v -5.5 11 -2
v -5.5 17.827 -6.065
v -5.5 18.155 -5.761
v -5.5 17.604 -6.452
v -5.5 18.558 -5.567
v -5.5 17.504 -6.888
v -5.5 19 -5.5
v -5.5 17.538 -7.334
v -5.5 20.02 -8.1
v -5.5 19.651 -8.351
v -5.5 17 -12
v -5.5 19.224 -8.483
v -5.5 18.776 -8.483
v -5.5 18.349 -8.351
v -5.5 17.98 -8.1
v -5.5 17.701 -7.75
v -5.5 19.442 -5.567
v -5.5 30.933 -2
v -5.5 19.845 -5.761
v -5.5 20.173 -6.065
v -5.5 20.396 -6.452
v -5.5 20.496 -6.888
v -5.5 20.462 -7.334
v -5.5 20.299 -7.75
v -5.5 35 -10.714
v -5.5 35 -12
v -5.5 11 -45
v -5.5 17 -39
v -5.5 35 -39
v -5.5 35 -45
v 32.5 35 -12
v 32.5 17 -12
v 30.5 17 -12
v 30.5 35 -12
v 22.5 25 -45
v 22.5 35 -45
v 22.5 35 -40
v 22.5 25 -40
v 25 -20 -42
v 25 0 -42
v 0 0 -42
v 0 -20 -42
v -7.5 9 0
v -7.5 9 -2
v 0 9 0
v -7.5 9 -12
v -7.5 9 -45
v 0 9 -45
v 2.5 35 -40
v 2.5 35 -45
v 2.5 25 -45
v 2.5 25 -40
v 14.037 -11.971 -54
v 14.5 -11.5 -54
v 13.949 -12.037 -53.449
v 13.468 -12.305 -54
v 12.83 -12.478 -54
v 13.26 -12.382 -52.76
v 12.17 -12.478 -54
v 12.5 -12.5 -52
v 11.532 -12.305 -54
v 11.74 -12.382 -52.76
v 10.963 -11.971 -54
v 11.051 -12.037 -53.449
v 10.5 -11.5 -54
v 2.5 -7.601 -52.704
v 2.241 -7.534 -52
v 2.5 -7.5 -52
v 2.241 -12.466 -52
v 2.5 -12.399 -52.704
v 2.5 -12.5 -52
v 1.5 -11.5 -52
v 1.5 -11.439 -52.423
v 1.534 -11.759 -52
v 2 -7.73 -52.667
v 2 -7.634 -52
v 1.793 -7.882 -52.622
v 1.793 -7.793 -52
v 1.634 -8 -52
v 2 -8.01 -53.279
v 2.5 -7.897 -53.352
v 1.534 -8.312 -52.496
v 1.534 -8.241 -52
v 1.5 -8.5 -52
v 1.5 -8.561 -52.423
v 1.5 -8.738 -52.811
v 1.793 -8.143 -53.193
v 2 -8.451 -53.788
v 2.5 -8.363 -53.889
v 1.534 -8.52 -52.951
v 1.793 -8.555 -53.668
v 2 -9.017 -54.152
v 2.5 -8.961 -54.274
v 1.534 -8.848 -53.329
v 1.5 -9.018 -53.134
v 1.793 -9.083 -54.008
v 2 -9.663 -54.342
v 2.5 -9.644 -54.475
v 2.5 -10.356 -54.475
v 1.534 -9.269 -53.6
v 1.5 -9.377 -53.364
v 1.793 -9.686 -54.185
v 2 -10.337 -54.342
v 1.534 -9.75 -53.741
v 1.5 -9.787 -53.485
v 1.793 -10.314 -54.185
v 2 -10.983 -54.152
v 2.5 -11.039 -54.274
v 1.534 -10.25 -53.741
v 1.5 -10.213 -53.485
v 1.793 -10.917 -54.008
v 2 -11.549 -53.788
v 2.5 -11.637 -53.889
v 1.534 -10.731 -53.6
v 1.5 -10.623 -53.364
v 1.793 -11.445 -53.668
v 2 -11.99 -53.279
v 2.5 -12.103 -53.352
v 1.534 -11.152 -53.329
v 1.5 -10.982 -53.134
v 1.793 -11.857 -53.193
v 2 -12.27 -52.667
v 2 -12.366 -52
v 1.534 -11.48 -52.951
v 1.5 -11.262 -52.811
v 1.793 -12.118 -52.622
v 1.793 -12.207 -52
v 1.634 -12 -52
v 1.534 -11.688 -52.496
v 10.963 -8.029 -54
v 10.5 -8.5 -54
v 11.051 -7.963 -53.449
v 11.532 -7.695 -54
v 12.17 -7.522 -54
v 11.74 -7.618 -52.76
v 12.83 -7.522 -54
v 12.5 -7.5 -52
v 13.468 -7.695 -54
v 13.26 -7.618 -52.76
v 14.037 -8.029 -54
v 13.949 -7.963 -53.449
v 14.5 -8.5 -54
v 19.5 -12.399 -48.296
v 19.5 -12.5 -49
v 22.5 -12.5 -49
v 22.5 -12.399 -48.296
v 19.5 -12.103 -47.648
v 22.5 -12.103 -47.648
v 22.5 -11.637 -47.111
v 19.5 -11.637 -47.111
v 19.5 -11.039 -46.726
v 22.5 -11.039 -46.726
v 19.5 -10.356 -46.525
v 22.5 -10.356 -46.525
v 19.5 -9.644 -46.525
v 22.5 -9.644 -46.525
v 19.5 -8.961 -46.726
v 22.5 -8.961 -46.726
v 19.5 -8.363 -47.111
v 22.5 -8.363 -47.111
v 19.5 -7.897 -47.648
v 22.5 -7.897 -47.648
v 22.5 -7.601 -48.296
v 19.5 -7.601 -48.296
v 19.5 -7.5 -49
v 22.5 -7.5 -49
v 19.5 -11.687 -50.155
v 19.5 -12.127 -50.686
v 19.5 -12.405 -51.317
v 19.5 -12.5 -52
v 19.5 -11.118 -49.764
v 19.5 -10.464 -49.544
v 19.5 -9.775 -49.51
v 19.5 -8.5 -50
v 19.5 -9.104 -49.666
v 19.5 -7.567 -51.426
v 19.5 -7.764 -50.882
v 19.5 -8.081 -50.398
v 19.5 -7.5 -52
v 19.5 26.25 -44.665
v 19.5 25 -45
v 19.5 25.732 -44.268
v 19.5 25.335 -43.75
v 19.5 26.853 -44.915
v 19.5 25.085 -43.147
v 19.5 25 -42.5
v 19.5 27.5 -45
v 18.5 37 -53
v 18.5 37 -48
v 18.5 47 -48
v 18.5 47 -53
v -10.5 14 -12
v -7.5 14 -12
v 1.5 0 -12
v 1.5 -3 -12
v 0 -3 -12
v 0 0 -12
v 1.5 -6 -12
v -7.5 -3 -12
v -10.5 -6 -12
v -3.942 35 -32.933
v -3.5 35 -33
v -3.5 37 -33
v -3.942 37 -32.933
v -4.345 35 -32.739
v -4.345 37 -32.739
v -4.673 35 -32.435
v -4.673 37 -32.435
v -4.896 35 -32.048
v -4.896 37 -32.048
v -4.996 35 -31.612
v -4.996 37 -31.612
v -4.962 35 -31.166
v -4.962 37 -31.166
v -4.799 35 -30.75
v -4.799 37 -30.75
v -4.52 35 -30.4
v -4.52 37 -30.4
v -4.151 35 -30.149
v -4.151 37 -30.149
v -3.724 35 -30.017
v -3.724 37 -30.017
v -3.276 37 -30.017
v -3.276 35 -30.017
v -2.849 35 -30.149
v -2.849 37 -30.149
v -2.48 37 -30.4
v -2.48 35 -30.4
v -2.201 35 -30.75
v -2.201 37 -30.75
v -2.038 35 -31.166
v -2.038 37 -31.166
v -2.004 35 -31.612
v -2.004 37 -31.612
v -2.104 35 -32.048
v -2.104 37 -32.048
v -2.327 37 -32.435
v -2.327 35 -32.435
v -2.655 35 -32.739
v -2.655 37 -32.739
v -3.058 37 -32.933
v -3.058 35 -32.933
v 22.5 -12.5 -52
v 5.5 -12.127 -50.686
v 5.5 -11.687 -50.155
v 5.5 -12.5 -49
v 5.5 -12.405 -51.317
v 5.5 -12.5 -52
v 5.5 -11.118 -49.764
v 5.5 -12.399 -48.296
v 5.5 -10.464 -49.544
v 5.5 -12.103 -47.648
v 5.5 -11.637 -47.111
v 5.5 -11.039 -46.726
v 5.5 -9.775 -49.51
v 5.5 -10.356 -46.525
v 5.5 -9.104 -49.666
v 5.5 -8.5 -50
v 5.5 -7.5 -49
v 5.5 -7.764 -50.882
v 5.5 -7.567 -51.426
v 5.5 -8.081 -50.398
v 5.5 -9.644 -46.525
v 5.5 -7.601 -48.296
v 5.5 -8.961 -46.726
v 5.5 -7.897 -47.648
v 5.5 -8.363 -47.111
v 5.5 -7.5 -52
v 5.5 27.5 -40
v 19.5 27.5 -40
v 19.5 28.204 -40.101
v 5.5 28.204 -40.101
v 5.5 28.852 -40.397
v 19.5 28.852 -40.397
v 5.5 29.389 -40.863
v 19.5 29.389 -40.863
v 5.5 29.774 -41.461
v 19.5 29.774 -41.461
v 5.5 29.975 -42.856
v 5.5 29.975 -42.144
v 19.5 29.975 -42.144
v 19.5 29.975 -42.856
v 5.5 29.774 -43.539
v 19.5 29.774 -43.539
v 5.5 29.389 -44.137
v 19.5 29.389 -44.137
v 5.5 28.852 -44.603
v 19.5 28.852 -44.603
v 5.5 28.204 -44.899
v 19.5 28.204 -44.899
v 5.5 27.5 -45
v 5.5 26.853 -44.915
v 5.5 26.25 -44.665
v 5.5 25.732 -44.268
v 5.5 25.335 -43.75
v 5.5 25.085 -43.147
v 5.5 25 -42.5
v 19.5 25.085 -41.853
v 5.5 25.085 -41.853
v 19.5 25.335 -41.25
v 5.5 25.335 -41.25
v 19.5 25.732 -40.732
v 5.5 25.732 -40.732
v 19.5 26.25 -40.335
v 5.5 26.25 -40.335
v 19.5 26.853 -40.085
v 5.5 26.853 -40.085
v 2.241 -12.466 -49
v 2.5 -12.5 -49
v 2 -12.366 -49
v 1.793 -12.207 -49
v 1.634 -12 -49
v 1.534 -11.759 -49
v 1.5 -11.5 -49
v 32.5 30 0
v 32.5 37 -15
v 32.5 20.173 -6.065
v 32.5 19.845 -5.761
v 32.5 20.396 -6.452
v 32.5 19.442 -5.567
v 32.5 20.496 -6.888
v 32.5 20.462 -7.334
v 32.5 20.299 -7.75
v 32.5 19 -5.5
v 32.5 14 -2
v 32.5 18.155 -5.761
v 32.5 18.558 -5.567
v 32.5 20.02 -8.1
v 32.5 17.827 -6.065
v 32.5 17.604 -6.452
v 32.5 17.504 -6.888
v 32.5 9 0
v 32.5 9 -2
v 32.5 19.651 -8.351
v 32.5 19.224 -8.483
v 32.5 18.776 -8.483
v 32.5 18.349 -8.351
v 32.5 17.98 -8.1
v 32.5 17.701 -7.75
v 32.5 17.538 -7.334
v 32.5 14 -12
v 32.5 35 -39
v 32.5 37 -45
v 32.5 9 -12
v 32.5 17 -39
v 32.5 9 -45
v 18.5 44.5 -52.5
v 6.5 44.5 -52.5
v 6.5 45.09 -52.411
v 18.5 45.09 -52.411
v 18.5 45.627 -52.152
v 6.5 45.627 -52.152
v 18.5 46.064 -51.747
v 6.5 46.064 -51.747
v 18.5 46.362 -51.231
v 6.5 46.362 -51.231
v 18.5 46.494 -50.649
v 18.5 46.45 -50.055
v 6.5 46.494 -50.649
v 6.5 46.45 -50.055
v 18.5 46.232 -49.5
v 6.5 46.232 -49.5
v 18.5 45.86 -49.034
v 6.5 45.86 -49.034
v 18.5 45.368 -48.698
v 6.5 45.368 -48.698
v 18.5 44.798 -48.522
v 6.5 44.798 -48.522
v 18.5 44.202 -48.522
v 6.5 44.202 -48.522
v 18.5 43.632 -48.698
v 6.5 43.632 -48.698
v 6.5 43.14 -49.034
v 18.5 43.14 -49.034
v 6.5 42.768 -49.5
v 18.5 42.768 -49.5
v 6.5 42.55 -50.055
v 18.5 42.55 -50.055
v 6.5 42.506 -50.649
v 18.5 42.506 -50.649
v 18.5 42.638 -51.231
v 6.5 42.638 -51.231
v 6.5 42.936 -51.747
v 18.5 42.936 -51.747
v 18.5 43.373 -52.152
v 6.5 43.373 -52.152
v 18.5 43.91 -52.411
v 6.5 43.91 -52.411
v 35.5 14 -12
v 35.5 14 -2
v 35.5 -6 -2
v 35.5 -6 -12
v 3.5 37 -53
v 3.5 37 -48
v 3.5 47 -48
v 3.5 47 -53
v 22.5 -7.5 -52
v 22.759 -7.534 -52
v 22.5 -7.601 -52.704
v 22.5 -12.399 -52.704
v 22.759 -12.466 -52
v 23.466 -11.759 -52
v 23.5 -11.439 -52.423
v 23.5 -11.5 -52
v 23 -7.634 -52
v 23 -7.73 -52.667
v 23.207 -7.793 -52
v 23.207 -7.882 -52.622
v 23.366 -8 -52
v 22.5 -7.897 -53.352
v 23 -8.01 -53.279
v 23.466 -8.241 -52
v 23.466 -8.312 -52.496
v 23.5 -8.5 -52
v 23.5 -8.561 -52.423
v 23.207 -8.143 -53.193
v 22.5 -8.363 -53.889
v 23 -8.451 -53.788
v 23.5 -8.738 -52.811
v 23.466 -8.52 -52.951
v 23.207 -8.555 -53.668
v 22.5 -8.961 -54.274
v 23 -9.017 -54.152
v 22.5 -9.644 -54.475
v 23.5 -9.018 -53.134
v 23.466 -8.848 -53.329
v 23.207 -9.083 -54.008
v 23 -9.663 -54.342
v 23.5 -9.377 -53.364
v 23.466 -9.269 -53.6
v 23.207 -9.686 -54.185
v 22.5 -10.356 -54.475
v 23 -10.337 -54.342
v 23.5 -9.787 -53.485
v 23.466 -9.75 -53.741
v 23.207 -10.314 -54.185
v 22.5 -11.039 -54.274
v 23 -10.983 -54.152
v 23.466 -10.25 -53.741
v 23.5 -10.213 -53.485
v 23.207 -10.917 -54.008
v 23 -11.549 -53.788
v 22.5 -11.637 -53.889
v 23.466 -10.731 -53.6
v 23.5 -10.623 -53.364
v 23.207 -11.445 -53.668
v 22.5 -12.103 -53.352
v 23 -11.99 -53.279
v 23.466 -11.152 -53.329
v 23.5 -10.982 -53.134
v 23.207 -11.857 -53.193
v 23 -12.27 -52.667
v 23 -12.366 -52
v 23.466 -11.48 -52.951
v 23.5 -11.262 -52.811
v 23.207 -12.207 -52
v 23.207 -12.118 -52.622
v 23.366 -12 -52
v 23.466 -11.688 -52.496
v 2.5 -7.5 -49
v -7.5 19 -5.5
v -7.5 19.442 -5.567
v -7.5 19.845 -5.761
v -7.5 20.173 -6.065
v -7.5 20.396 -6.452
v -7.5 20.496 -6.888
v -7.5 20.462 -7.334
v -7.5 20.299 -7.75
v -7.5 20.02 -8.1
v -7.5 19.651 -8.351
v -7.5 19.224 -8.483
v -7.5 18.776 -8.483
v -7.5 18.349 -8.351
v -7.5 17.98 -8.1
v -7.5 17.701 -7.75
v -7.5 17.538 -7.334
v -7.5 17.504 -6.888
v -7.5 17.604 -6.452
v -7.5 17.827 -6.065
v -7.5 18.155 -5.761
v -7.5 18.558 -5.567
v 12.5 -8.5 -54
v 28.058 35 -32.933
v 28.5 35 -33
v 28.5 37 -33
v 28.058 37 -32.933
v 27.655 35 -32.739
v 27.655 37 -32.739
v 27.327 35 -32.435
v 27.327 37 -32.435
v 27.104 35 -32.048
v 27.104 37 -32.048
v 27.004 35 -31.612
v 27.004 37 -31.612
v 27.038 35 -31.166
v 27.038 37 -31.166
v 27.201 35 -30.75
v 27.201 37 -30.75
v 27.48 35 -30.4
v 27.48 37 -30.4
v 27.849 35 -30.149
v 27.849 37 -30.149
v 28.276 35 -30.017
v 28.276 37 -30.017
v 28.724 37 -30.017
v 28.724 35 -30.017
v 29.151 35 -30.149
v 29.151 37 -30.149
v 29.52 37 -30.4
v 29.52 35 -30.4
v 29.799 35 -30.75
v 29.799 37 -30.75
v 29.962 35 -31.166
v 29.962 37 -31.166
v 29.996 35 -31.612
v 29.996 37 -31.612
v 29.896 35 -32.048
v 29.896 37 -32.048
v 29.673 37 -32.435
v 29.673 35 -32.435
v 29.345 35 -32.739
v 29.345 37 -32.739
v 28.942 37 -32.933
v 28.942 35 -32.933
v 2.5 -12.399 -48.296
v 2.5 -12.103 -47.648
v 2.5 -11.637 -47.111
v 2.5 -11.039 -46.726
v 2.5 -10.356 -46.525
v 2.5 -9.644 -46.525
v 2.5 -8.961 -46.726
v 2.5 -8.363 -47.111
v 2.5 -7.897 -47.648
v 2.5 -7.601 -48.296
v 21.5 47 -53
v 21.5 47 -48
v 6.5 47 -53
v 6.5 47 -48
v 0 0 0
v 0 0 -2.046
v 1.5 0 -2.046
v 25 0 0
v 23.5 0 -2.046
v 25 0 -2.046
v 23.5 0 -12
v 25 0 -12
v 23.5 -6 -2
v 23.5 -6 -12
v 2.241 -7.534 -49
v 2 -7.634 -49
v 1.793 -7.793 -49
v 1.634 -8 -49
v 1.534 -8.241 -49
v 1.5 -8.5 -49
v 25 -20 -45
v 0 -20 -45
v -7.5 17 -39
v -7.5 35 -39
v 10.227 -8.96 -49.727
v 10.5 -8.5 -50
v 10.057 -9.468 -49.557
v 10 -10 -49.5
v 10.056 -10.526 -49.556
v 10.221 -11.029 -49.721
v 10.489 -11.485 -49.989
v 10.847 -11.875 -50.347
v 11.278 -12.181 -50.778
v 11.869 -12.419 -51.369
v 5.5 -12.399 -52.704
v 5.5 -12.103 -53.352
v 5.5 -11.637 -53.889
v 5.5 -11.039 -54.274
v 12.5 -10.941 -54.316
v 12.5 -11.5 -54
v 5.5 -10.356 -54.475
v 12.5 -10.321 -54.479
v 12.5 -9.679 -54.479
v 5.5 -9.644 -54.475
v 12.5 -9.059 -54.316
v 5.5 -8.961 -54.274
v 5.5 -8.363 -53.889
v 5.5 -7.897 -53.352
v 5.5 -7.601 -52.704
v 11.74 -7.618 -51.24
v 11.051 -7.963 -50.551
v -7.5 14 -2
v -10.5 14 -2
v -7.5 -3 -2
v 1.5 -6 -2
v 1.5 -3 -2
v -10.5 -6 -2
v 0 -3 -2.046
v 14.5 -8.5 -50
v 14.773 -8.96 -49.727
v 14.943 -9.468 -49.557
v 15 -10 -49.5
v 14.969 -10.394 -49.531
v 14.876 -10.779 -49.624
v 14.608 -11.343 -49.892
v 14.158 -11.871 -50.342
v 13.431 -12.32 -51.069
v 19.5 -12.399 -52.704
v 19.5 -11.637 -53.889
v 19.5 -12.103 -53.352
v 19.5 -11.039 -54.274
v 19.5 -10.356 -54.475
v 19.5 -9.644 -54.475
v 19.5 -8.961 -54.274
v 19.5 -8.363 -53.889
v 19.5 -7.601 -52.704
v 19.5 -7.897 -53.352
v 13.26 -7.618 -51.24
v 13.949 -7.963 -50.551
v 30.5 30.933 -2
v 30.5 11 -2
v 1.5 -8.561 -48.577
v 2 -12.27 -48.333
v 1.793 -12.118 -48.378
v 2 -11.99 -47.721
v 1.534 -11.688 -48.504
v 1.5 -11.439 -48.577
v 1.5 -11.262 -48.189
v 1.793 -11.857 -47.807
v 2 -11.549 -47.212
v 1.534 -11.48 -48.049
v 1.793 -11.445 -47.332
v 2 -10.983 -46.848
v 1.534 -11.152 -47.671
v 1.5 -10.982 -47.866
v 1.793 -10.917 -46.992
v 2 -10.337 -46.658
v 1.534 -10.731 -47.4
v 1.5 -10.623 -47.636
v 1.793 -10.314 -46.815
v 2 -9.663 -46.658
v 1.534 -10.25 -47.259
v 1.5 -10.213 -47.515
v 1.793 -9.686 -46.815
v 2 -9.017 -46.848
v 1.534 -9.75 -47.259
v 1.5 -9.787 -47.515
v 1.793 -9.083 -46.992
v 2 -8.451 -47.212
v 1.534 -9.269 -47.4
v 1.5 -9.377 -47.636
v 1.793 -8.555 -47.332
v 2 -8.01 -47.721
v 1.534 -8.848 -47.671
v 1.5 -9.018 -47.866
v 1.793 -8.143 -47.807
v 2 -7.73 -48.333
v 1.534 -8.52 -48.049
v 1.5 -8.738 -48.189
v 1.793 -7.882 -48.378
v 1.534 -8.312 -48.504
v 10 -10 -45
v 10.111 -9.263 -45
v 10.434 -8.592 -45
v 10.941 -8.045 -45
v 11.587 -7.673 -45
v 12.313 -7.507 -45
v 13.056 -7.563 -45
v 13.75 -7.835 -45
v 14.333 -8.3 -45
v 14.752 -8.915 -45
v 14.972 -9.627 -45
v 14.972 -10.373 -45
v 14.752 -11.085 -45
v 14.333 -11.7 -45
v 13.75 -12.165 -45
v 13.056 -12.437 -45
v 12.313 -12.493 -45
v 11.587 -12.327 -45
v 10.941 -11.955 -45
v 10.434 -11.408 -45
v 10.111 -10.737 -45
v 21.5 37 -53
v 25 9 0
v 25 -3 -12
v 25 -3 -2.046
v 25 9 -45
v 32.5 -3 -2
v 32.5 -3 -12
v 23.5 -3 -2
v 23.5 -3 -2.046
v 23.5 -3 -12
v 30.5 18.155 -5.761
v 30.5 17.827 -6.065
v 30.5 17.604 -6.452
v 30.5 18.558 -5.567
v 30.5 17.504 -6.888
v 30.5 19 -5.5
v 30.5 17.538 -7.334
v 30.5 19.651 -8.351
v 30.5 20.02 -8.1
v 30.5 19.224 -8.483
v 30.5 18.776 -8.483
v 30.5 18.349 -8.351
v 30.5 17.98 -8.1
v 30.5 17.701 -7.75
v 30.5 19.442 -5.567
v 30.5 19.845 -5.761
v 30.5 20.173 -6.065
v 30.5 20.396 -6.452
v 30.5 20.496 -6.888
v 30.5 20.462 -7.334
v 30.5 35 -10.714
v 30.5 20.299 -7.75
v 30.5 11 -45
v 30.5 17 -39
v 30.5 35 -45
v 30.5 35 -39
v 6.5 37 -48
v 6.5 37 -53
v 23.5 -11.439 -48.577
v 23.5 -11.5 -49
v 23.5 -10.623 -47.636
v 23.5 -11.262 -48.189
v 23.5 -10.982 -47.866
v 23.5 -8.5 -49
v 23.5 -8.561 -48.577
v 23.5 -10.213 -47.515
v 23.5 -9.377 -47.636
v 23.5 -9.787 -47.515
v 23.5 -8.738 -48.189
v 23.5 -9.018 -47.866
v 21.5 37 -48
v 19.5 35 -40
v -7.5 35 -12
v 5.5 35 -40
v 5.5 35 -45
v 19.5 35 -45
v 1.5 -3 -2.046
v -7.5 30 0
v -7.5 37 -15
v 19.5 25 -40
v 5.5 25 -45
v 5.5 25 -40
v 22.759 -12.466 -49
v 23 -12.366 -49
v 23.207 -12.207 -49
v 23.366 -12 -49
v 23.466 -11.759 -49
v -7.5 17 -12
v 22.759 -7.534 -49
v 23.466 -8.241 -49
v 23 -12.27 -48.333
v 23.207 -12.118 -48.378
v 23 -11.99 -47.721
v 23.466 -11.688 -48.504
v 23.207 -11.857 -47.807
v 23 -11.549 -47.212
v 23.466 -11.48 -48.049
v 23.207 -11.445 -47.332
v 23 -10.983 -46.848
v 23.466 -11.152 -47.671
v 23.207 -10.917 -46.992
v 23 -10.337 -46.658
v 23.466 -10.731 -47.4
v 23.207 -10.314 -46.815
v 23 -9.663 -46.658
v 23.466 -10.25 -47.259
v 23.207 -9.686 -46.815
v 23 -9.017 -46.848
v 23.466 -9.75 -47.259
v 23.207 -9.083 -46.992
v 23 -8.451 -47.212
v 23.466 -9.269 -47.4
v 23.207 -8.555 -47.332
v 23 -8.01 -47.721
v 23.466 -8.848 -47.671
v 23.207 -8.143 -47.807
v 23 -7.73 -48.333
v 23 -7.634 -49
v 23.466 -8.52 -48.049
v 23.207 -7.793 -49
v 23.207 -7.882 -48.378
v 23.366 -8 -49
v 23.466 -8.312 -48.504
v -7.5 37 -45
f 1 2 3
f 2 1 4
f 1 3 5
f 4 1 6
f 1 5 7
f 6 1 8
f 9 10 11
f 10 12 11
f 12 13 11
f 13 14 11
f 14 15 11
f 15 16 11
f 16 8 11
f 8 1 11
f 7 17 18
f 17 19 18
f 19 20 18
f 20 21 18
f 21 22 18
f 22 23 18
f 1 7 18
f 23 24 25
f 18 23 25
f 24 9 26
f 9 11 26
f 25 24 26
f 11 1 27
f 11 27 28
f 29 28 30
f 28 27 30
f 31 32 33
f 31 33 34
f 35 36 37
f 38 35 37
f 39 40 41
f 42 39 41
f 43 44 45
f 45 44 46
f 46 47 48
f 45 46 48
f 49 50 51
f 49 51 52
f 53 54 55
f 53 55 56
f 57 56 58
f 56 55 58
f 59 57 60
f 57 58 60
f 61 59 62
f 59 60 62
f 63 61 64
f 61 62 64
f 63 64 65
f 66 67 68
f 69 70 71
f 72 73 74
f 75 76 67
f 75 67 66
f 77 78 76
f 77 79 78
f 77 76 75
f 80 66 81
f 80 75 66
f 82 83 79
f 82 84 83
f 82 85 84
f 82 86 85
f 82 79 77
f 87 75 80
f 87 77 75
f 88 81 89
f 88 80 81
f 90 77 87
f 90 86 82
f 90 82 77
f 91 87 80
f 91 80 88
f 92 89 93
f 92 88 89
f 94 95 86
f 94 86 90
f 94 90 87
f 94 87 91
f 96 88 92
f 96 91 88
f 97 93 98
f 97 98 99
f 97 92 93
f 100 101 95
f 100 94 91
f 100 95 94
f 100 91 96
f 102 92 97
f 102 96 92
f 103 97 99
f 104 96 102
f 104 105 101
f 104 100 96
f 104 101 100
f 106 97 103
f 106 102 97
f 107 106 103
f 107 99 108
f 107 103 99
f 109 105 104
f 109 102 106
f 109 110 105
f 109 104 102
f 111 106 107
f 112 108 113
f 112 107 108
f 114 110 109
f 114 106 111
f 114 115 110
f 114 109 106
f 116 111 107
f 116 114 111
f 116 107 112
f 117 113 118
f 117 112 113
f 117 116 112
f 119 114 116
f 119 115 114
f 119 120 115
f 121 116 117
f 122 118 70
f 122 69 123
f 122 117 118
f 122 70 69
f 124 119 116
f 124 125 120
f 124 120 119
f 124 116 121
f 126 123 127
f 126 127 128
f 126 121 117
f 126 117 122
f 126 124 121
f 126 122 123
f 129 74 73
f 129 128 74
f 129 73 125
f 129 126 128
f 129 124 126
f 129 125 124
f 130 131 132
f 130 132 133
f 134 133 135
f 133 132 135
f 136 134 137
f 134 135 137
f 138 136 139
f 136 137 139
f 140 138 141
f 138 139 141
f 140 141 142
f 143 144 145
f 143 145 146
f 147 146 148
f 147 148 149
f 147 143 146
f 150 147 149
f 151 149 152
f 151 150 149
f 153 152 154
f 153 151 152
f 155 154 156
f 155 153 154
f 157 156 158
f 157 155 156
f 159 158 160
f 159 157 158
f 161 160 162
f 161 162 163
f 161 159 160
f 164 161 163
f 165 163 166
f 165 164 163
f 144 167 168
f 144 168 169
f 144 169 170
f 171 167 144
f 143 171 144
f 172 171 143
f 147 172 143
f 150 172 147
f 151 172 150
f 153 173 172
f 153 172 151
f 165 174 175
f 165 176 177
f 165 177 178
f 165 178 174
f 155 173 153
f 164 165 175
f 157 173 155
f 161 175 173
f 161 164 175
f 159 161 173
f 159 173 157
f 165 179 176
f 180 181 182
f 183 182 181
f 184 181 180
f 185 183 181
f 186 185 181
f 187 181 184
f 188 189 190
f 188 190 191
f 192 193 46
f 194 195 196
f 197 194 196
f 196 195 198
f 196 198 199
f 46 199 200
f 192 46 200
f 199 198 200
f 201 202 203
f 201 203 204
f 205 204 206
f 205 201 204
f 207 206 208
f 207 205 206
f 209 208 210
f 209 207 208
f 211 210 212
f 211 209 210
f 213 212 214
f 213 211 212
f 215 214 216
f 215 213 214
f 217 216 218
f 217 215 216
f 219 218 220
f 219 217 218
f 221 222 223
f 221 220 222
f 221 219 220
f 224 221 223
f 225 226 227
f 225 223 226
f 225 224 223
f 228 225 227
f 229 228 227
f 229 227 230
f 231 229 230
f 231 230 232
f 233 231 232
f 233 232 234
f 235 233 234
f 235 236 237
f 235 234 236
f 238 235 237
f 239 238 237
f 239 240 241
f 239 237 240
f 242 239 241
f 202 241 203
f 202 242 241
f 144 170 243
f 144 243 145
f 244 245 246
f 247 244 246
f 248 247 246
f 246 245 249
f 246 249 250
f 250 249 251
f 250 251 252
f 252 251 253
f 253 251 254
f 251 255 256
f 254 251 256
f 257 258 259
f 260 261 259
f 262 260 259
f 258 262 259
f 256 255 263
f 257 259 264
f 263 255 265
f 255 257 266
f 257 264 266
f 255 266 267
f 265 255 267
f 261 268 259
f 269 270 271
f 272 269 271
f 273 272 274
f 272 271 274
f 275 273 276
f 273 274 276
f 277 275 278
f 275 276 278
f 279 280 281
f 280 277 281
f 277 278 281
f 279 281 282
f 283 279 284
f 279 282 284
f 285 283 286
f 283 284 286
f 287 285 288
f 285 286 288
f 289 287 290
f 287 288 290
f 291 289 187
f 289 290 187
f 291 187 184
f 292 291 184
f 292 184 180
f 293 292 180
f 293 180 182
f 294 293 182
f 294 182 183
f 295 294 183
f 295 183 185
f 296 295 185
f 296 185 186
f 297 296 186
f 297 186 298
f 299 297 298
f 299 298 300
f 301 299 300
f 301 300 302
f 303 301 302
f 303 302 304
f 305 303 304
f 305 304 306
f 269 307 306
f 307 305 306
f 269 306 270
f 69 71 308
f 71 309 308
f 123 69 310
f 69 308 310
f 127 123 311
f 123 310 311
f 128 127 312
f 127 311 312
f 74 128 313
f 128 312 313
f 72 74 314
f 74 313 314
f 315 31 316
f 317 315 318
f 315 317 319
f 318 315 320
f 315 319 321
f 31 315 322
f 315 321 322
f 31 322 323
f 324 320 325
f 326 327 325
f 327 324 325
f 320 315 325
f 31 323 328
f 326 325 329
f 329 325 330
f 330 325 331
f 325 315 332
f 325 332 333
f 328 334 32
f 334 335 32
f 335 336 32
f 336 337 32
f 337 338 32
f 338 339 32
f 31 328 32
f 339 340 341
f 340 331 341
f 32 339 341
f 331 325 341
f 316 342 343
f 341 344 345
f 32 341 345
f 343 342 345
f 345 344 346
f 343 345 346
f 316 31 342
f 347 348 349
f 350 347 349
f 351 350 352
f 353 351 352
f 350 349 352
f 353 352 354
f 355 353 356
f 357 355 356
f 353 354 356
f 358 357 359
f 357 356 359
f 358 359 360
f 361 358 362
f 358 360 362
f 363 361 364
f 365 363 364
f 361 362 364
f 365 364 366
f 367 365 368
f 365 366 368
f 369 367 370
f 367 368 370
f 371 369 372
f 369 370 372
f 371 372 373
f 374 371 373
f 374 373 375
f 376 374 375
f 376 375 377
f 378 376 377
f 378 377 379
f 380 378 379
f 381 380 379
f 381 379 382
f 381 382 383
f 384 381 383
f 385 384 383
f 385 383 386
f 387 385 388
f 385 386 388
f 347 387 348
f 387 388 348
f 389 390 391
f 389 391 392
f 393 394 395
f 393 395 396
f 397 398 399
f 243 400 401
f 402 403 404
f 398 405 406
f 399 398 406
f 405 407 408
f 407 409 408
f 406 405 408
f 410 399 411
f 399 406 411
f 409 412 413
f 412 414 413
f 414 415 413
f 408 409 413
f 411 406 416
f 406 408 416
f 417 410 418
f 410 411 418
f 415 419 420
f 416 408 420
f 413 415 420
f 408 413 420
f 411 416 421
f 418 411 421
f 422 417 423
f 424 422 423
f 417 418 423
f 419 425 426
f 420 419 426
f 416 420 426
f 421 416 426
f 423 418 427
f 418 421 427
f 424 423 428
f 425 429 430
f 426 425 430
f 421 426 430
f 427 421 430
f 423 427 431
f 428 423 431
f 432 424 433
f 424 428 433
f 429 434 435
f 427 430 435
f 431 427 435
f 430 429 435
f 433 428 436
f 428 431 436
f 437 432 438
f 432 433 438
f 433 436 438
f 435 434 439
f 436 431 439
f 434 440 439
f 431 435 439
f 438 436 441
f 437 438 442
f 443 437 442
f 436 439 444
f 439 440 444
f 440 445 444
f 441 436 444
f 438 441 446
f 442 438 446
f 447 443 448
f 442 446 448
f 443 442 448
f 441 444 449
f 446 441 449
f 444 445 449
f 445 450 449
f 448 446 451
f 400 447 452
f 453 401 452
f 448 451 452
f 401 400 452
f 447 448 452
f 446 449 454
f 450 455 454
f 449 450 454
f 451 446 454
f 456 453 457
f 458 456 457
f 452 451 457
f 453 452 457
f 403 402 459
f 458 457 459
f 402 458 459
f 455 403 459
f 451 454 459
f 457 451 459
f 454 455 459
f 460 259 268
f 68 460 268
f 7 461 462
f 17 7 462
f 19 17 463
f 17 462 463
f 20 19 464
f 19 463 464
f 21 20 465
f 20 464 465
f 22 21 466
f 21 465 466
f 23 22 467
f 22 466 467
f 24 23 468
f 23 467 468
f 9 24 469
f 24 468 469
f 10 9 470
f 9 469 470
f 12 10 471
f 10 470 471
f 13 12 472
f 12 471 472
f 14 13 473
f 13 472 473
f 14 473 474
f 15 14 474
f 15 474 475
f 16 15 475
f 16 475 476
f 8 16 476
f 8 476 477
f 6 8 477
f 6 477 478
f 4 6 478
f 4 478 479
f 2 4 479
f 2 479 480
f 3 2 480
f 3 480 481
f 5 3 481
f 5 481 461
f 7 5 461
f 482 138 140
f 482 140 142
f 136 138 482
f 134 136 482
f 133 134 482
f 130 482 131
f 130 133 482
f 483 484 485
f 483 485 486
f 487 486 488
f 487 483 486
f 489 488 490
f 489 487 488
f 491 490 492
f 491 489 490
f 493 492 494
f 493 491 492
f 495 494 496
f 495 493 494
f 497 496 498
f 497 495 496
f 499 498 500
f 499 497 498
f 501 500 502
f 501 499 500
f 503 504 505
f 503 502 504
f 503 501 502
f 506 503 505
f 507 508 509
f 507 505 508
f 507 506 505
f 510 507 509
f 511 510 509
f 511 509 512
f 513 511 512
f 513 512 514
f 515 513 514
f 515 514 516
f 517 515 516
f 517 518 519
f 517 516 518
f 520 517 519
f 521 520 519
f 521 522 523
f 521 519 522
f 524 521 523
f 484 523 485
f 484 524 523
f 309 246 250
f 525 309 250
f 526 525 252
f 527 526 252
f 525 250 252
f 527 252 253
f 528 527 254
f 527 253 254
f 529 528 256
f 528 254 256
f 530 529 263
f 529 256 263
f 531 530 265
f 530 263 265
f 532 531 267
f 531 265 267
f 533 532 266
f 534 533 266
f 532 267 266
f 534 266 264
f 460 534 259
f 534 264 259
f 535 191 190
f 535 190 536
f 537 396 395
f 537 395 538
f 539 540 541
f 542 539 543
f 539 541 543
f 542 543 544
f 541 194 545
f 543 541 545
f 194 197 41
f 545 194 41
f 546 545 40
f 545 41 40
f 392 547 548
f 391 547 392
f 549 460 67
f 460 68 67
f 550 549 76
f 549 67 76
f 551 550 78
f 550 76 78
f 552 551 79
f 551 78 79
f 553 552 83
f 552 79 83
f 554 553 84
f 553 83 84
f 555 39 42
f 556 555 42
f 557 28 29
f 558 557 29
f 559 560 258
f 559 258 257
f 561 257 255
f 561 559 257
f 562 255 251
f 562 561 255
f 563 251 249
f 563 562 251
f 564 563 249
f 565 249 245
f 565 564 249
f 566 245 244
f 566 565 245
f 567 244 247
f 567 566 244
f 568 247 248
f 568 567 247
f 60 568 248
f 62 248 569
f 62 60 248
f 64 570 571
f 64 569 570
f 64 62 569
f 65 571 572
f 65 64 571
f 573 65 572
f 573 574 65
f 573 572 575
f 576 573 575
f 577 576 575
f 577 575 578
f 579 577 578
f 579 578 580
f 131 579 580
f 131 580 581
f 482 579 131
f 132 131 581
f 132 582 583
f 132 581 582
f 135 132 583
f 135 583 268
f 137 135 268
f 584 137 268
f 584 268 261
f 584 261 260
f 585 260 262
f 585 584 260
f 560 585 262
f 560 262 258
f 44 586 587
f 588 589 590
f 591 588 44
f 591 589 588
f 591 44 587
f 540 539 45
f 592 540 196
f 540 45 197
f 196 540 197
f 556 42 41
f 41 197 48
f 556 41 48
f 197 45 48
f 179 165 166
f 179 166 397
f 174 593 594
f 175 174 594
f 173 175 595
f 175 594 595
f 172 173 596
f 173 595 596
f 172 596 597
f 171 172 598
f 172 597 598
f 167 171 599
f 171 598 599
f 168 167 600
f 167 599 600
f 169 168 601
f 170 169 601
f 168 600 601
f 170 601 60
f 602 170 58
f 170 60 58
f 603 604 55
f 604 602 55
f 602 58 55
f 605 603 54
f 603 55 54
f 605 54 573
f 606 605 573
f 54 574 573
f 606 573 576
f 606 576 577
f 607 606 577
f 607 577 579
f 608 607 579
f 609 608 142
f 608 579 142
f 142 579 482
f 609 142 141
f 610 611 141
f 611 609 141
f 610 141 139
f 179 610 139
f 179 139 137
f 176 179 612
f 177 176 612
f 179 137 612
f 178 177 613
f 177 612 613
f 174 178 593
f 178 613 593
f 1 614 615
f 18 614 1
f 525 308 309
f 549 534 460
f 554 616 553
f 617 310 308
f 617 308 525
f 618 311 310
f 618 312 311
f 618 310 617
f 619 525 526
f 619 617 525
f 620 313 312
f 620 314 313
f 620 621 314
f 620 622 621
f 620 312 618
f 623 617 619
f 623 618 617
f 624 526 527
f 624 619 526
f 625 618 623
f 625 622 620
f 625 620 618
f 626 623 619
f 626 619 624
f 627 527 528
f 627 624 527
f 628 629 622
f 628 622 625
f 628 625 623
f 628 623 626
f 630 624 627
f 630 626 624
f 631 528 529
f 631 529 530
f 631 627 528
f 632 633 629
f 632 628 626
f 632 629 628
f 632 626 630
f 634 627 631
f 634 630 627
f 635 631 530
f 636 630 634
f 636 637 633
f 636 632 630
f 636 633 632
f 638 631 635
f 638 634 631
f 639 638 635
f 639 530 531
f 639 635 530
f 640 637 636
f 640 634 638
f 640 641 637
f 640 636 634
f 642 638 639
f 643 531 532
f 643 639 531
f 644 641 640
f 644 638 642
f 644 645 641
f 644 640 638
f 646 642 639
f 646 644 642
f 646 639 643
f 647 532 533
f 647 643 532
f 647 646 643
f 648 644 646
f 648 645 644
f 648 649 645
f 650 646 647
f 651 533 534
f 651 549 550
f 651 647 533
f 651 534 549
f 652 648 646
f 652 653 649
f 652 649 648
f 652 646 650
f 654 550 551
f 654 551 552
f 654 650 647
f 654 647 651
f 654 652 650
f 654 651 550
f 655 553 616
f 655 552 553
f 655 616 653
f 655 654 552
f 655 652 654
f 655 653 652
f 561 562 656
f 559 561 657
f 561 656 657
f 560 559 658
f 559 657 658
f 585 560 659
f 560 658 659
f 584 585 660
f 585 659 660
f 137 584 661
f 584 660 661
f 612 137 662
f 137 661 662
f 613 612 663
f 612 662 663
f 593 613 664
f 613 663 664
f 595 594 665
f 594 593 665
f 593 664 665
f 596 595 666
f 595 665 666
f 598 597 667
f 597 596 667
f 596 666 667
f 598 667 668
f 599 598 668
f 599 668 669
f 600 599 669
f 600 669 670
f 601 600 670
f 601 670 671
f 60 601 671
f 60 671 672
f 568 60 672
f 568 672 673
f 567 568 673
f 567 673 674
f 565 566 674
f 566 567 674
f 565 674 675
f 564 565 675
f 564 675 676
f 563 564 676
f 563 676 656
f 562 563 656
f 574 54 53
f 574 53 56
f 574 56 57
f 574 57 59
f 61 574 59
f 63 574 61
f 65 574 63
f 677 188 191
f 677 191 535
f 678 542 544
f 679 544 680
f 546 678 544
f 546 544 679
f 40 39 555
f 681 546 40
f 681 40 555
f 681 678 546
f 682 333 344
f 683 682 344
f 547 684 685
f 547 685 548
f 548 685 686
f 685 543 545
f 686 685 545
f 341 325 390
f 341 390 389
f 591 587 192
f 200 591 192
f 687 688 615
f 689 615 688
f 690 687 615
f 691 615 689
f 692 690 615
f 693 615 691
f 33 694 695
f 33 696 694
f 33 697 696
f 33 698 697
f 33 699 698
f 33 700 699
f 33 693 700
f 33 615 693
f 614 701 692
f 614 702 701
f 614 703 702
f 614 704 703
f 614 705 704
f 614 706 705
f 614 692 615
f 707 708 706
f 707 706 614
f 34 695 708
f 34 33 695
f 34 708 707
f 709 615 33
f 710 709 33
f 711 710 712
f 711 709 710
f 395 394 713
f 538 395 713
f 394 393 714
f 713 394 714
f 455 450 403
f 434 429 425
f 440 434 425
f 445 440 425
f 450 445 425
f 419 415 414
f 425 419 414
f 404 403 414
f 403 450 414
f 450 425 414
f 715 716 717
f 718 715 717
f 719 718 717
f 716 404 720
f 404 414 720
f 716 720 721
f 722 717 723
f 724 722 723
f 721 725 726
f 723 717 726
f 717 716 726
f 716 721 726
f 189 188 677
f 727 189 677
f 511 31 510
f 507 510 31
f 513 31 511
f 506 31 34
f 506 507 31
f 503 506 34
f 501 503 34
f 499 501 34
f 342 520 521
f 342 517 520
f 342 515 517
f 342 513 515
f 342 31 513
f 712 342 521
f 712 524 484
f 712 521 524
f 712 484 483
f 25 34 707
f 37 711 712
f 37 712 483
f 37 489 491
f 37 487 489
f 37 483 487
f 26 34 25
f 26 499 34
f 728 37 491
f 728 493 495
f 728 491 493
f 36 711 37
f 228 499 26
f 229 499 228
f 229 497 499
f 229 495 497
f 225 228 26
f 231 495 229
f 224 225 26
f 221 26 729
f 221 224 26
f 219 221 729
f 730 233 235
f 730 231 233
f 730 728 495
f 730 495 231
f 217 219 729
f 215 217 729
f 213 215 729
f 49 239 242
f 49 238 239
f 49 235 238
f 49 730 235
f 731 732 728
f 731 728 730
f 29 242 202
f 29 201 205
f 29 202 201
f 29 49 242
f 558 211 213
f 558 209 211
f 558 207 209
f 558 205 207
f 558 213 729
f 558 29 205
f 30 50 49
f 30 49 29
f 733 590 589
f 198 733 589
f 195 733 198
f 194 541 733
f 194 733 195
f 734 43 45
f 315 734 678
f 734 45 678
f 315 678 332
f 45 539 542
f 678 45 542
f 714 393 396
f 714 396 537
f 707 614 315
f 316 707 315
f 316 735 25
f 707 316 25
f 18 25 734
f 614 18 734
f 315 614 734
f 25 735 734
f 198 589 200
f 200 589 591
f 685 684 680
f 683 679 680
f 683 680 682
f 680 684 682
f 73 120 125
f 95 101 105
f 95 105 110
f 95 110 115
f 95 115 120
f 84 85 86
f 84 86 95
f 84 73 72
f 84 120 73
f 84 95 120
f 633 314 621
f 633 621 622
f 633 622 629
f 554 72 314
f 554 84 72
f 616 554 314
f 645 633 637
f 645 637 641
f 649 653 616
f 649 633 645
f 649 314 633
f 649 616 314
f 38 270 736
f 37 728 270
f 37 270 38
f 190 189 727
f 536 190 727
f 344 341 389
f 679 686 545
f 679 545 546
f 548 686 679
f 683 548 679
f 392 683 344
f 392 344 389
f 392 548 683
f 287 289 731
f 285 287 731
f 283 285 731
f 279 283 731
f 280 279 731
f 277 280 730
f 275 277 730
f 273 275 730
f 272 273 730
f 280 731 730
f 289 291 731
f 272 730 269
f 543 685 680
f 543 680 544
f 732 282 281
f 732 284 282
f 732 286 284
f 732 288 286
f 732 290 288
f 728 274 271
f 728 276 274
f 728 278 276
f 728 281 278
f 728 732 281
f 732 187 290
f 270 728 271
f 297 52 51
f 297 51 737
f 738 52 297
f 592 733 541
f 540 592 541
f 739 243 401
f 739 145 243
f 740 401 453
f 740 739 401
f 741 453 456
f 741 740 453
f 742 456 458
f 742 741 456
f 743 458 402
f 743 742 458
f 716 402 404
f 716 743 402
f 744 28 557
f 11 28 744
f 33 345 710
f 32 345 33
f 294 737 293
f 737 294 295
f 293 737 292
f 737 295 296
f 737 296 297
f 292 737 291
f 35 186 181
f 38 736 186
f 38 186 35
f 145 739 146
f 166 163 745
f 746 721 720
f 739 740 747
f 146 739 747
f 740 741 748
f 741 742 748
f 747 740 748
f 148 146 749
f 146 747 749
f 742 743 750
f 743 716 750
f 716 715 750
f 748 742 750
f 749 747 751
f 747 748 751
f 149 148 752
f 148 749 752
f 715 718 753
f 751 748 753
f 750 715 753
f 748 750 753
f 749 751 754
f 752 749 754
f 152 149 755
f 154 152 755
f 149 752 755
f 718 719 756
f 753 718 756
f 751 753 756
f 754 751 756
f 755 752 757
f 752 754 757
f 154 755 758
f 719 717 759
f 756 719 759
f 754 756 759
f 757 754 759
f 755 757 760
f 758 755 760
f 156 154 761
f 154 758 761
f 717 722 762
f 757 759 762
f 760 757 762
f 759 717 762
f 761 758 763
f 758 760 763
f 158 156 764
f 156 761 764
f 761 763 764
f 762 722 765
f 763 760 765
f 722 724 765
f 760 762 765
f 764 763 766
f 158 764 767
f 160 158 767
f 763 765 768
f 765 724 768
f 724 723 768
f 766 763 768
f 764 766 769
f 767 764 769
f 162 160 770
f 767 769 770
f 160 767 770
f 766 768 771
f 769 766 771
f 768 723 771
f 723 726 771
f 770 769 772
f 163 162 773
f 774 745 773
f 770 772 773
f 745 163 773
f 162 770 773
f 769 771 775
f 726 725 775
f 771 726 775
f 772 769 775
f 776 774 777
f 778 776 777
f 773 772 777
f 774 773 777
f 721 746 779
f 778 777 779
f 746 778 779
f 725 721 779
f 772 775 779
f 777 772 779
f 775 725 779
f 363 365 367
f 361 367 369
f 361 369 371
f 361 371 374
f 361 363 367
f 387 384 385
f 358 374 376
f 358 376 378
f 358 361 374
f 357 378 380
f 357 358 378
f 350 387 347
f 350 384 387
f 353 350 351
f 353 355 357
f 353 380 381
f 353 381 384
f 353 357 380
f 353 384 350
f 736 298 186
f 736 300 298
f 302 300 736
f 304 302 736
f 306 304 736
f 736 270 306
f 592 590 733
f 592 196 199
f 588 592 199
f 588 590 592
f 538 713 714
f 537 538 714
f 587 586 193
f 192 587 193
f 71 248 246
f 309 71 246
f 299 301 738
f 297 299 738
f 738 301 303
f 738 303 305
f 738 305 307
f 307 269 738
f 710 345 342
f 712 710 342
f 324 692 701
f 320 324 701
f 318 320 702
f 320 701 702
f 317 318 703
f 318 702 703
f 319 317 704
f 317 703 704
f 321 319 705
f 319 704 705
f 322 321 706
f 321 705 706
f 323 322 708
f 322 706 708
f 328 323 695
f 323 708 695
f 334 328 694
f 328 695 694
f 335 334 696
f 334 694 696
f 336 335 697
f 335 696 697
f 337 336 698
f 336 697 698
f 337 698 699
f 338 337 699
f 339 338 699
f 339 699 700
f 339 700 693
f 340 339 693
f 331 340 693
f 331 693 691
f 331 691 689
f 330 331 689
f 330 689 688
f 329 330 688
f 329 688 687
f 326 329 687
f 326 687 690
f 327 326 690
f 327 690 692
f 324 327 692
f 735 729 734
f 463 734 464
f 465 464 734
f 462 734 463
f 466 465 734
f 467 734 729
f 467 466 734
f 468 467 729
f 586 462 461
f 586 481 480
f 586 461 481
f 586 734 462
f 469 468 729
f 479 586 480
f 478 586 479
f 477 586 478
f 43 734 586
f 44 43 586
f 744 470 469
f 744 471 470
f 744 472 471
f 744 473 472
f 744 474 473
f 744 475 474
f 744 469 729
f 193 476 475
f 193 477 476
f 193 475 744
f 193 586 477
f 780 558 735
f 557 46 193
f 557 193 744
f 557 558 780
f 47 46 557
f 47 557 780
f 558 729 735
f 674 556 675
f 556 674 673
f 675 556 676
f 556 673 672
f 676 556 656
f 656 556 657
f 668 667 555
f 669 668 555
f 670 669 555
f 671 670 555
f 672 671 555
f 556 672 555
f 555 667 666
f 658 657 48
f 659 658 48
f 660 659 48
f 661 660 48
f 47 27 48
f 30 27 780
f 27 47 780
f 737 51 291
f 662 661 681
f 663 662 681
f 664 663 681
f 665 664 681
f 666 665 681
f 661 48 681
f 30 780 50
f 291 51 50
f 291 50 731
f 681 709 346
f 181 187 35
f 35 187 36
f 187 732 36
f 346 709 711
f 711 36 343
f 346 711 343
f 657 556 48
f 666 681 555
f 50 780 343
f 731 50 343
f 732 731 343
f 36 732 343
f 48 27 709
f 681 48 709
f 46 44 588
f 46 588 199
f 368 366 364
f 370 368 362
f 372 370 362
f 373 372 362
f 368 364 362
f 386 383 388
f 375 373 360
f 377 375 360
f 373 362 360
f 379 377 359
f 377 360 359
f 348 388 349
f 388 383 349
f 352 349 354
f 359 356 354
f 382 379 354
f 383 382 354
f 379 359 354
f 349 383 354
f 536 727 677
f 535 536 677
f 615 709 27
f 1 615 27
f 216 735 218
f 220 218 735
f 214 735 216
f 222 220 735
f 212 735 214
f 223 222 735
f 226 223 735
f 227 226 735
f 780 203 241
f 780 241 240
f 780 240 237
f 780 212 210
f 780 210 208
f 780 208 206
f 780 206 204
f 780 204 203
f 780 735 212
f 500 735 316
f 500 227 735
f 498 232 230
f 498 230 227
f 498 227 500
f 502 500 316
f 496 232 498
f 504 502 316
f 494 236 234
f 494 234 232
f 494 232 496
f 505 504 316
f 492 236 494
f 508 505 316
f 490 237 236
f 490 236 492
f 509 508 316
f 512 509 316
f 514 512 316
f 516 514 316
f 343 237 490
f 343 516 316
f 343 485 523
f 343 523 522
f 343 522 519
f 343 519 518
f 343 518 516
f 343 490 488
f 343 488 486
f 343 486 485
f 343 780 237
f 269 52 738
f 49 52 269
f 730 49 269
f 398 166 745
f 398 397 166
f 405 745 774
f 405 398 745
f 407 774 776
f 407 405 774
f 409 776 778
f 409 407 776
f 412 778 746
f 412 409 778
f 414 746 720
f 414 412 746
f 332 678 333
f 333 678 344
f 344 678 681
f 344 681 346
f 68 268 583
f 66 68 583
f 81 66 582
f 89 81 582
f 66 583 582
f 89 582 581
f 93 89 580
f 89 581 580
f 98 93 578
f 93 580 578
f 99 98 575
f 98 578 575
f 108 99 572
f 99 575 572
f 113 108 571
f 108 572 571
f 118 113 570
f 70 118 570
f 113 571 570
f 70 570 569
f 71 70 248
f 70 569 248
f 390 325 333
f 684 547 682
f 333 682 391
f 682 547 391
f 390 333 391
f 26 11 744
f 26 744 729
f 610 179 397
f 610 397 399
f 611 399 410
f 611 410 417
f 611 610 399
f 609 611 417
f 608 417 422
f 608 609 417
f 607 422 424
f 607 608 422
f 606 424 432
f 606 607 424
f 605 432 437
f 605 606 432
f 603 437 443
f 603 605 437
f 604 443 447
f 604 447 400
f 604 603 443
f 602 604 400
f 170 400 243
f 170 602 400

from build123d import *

# Parameters (mm, degrees)
SKETCH_1_W               = 25
SKETCH_1_H               = 42
EXTRUDE_1_DEPTH          = 9
SKETCH_2_W               = 25
SKETCH_2_H               = 29
EXTRUDE_2_DEPTH          = 3
SKETCH_3_W               = 40
SKETCH_3_H               = 45
EXTRUDE_3_DEPTH          = 28
SKETCH_4_W               = 36
SKETCH_4_H               = 24
CUT_EXTRUDE_1_DEPTH      = 43
SKETCH_6_W               = 10
SKETCH_6_H               = 20
EXTRUDE_4_DEPTH          = 3
SKETCH_7_W               = 9
SKETCH_7_H               = 10
EXTRUDE_5_DEPTH          = 3
SKETCH_8_W               = 3
SKETCH_8_H               = 5
EXTRUDE_6_DEPTH          = 10
EXTRUDE_6_2_DEPTH        = 10
SKETCH_9_R               = 2
EXTRUDE_7_DEPTH          = 12
SKETCH_10_R              = 1.5
CUT_EXTRUDE_2_DEPTH      = 83.867363902
SKETCH_11_R              = 2.5
EXTRUDE_8_DEPTH          = 9
SKETCH_12_R              = 2.5
EXTRUDE_9_DEPTH          = 7
EXTRUDE_10_DEPTH         = 4
FILLET_1_R               = 1
FILLET_1_OF_MIRROR_2_R   = 1
CUT_EXTRUDE_3_DEPTH      = 84.834658704
CUT_EXTRUDE_5_DEPTH      = 83.826626154
CUT_EXTRUDE_5_DEPTH_BACK = 83.826626154
SKETCH_19_W              = 27
SKETCH_19_H              = 18
CUT_EXTRUDE_6_DEPTH      = 87.484102585
CUT_EXTRUDE_6_DEPTH_BACK = 10
SKETCH_20_R              = 1.5
SKETCH_21_W              = 3
SKETCH_21_H              = 5
EXTRUDE_11_DEPTH         = 10
EXTRUDE_12_REACH         = 79.97
SKETCH_22_R              = 2.5
SKETCH_23_W              = 9.954208599
SKETCH_23_H              = 3
EXTRUDE_13_DEPTH         = 1.5


with BuildPart() as part:
    # ｽｹｯﾁ1 → ﾎﾞｽ - 押し出し1 (new body)
    with BuildSketch(Plane(origin=(0, 0, 0), x_dir=(1, 0, 0), z_dir=(0, 1, 0))):
        with Locations((12.5, 21)):
            Rectangle(SKETCH_1_W, SKETCH_1_H)
    extrude(amount=EXTRUDE_1_DEPTH)

    # ｽｹｯﾁ2 → ﾎﾞｽ - 押し出し2 (add)
    with BuildSketch(Plane(origin=(0, 0, -42), x_dir=(-1, 0, 0), z_dir=(0, 0, -1))):
        with Locations((-12.5, -5.5)):
            Rectangle(SKETCH_2_W, SKETCH_2_H)
    extrude(amount=EXTRUDE_2_DEPTH)

    # ｽｹｯﾁ3 → ﾎﾞｽ - 押し出し3 (add)
    with BuildSketch(Plane(origin=(0, 9, 0), x_dir=(1, 0, 0), z_dir=(0, 1, 0))):
        with Locations((12.5, 22.5)):
            Rectangle(SKETCH_3_W, SKETCH_3_H)
    extrude(amount=EXTRUDE_3_DEPTH)

    # ｽｹｯﾁ4 → ｶｯﾄ - 押し出し1 (cut)
    with BuildSketch(Plane(origin=(0, 0, -45), x_dir=(-1, 0, 0), z_dir=(0, 0, -1))):
        with Locations((-12.5, 23)):
            Rectangle(SKETCH_4_W, SKETCH_4_H)
    extrude(amount=-CUT_EXTRUDE_1_DEPTH, mode=Mode.SUBTRACT)

    # ｽｹｯﾁ6 → ﾎﾞｽ - 押し出し4 (add)
    with BuildSketch(Plane(origin=(32.5, 0, 0), x_dir=(0, 0, -1), z_dir=(1, 0, 0))):
        with Locations((7, 4)):
            Rectangle(SKETCH_6_W, SKETCH_6_H)
    extrude_4 = extrude(amount=EXTRUDE_4_DEPTH)

    # ｽｹｯﾁ7 → ﾎﾞｽ - 押し出し5 (add)
    with BuildSketch(Plane.XZ.offset(6)):
        with Locations((28, -7)):
            Rectangle(SKETCH_7_W, SKETCH_7_H)
    extrude_5 = extrude(amount=-EXTRUDE_5_DEPTH)

    # ﾐﾗｰ1: ﾎﾞｽ - 押し出し4, ﾎﾞｽ - 押し出し5 across plane
    add(extrude_4.mirror(Plane(origin=(12.5, 0, 0), x_dir=(0, 0, 1), z_dir=(1, 0, 0))))
    add(extrude_5.mirror(Plane(origin=(12.5, 0, 0), x_dir=(0, 0, 1), z_dir=(1, 0, 0))))

    # ｽｹｯﾁ10 → ｶｯﾄ - 押し出し2 (cut, through all)
    with BuildSketch(Plane.ZY.offset(7.5)):
        with Locations((-7, 19)):
            Circle(SKETCH_10_R)
    extrude(amount=-CUT_EXTRUDE_2_DEPTH, mode=Mode.SUBTRACT)

    # ｽｹｯﾁ11 → ﾎﾞｽ - 押し出し8 (add)
    with BuildSketch(Plane(origin=(0, 0, -45), x_dir=(-1, 0, 0), z_dir=(0, 0, -1))):
        with Locations((-12.5, -10)):
            Circle(SKETCH_11_R)
    extrude(amount=EXTRUDE_8_DEPTH)

    # ｽｹｯﾁ12 → ﾎﾞｽ - 押し出し9 (add)
    with BuildSketch(Plane(origin=(12.5, 0, 0), x_dir=(0, 0, -1), z_dir=(1, 0, 0))):
        with Locations(Location((52, -10, 0), (0, 0, 143.130102354))):
            Circle(SKETCH_12_R)
    extrude_9 = extrude(amount=EXTRUDE_9_DEPTH)

    # ｽｹｯﾁ13 → ﾎﾞｽ - 押し出し10 (add)
    with BuildSketch(Plane(origin=(19.5, 0, 0), x_dir=(0, 0, -1), z_dir=(1, 0, 0))):
        with BuildLine():
            Line((52, -12.5), (49, -12.5))
            ThreePointArc((49, -12.5), (46.5, -10), (49, -7.5))
            Line((49, -7.5), (52, -7.5))
            ThreePointArc((52, -7.5), (54.5, -10), (52, -12.5))
        make_face()
    extrude_10 = extrude(amount=EXTRUDE_10_DEPTH)

    # ﾌｨﾚｯﾄ1
    fillet_1_edges = [part.edges().sort_by_distance(p)[0] for p in [
        (23.5, -10, -54.5),
        (23.5, -7.5, -50.5),
        (23.5, -10, -46.5),
        (23.5, -12.5, -50.5),
    ]]
    fillet(fillet_1_edges, radius=FILLET_1_R)

    # ﾐﾗｰ2: ﾎﾞｽ - 押し出し9, ﾎﾞｽ - 押し出し10 across plane
    add(extrude_9.mirror(Plane(origin=(12.5, 0, 0), x_dir=(0, 0, 1), z_dir=(1, 0, 0))))
    add(extrude_10.mirror(Plane(origin=(12.5, 0, 0), x_dir=(0, 0, 1), z_dir=(1, 0, 0))))

    # ﾌｨﾚｯﾄ1 of ﾐﾗｰ2
    fillet_1_of_mirror_2_edges = [part.edges().sort_by_distance(p)[0] for p in [
        (1.5, -10, -54.5),
        (1.5, -7.5, -50.5),
        (1.5, -10, -46.5),
        (1.5, -12.5, -50.5),
    ]]
    fillet(fillet_1_of_mirror_2_edges, radius=FILLET_1_OF_MIRROR_2_R)

    # ｽｹｯﾁ14 → ｶｯﾄ - 押し出し3 (cut, through all)
    with BuildSketch(Plane.ZY.offset(7.5)):
        Polygon((-15, 37), (0, 30), (0, 37), align=None)
    extrude(amount=-CUT_EXTRUDE_3_DEPTH, mode=Mode.SUBTRACT)

    # ｽｹｯﾁ19 → ｶｯﾄ - 押し出し5 (cut, two sides: drawn at the far end of the back side and taken through both)
    with BuildSketch(Plane.ZY.offset(-30.5).offset(-CUT_EXTRUDE_5_DEPTH_BACK)):
        with Locations((-25.5, 26)):
            Rectangle(SKETCH_19_W, SKETCH_19_H)
    extrude(amount=CUT_EXTRUDE_5_DEPTH + CUT_EXTRUDE_5_DEPTH_BACK, mode=Mode.SUBTRACT)

    # ｽｹｯﾁ20 → ｶｯﾄ - 押し出し6 (cut, two sides: drawn at the far end of the back side and taken through both)
    with BuildSketch(Plane(origin=(0, 37, 0), x_dir=(1, 0, 0), z_dir=(0, 1, 0)).offset(-CUT_EXTRUDE_6_DEPTH_BACK)):
        with Locations(Location((-3.5, 31.5, 0), (0, 0, 90))):
            Circle(SKETCH_20_R)
        with Locations(Location((28.5, 31.5, 0), (0, 0, 90))):
            Circle(SKETCH_20_R)
    extrude(amount=CUT_EXTRUDE_6_DEPTH + CUT_EXTRUDE_6_DEPTH_BACK, mode=Mode.SUBTRACT)

    # ｽｹｯﾁ21 → ﾎﾞｽ - 押し出し11 (add)
    with BuildSketch(Plane.XZ.offset(-35)):
        with Locations((21, -42.5)):
            Rectangle(SKETCH_21_W, SKETCH_21_H)
        with Locations((4, -42.5)):
            Rectangle(SKETCH_21_W, SKETCH_21_H)
    extrude(amount=EXTRUDE_11_DEPTH)

    # ｽｹｯﾁ22 → ﾎﾞｽ - 押し出し12 (add, up to next)
    with BuildSketch(Plane.ZY.offset(-19.5), mode=Mode.PRIVATE) as extrude_12_sk1:
        with Locations((-42.5, 27.5)):
            Circle(SKETCH_22_R)
    extrude_12_tool1 = extrude(extrude_12_sk1.sketch, amount=EXTRUDE_12_REACH, mode=Mode.PRIVATE) - part.part
    add(extrude_12_tool1.solids().sort_by_distance((19.5, 27.5, -42.5))[0])

    # ｽｹｯﾁ23 → ﾎﾞｽ - 押し出し13 (add)
    with BuildSketch(Plane(origin=(1.5, 0, 0), x_dir=(0, 0, -1), z_dir=(1, 0, 0))):
        with Locations((7.022895701, -1.5)):
            Rectangle(SKETCH_23_W, SKETCH_23_H)
    extrude_13 = extrude(amount=-EXTRUDE_13_DEPTH)

    # ﾐﾗｰ3: ﾎﾞｽ - 押し出し13 across plane
    add(extrude_13.mirror(Plane(origin=(12.5, 0, 0), x_dir=(0, 0, 1), z_dir=(1, 0, 0))))


with BuildPart() as body_2:
    # ｽｹｯﾁ8 → ﾎﾞｽ - 押し出し6 (new body)
    with BuildSketch(Plane(origin=(0, 37, 0), x_dir=(1, 0, 0), z_dir=(0, 1, 0))):
        with Locations((5, 50.5)):
            Rectangle(SKETCH_8_W, SKETCH_8_H)
    extrude(amount=EXTRUDE_6_DEPTH)


with BuildPart() as body_3:
    # ｽｹｯﾁ8 → Extrude 6 2 (new body)
    with BuildSketch(Plane(origin=(0, 37, 0), x_dir=(1, 0, 0), z_dir=(0, 1, 0))):
        with Locations((20, 50.5)):
            Rectangle(SKETCH_8_W, SKETCH_8_H)
    extrude(amount=EXTRUDE_6_2_DEPTH)


with BuildPart() as body_4:
    # ｽｹｯﾁ9 → ﾎﾞｽ - 押し出し7 (new body)
    with BuildSketch(Plane(origin=(6.5, 0, 0), x_dir=(0, 0, -1), z_dir=(1, 0, 0))):
        with Locations((50.5, 44.5)):
            Circle(SKETCH_9_R)
    extrude(amount=EXTRUDE_7_DEPTH)


solid = Compound([part.part, body_2.part, body_3.part, body_4.part])
